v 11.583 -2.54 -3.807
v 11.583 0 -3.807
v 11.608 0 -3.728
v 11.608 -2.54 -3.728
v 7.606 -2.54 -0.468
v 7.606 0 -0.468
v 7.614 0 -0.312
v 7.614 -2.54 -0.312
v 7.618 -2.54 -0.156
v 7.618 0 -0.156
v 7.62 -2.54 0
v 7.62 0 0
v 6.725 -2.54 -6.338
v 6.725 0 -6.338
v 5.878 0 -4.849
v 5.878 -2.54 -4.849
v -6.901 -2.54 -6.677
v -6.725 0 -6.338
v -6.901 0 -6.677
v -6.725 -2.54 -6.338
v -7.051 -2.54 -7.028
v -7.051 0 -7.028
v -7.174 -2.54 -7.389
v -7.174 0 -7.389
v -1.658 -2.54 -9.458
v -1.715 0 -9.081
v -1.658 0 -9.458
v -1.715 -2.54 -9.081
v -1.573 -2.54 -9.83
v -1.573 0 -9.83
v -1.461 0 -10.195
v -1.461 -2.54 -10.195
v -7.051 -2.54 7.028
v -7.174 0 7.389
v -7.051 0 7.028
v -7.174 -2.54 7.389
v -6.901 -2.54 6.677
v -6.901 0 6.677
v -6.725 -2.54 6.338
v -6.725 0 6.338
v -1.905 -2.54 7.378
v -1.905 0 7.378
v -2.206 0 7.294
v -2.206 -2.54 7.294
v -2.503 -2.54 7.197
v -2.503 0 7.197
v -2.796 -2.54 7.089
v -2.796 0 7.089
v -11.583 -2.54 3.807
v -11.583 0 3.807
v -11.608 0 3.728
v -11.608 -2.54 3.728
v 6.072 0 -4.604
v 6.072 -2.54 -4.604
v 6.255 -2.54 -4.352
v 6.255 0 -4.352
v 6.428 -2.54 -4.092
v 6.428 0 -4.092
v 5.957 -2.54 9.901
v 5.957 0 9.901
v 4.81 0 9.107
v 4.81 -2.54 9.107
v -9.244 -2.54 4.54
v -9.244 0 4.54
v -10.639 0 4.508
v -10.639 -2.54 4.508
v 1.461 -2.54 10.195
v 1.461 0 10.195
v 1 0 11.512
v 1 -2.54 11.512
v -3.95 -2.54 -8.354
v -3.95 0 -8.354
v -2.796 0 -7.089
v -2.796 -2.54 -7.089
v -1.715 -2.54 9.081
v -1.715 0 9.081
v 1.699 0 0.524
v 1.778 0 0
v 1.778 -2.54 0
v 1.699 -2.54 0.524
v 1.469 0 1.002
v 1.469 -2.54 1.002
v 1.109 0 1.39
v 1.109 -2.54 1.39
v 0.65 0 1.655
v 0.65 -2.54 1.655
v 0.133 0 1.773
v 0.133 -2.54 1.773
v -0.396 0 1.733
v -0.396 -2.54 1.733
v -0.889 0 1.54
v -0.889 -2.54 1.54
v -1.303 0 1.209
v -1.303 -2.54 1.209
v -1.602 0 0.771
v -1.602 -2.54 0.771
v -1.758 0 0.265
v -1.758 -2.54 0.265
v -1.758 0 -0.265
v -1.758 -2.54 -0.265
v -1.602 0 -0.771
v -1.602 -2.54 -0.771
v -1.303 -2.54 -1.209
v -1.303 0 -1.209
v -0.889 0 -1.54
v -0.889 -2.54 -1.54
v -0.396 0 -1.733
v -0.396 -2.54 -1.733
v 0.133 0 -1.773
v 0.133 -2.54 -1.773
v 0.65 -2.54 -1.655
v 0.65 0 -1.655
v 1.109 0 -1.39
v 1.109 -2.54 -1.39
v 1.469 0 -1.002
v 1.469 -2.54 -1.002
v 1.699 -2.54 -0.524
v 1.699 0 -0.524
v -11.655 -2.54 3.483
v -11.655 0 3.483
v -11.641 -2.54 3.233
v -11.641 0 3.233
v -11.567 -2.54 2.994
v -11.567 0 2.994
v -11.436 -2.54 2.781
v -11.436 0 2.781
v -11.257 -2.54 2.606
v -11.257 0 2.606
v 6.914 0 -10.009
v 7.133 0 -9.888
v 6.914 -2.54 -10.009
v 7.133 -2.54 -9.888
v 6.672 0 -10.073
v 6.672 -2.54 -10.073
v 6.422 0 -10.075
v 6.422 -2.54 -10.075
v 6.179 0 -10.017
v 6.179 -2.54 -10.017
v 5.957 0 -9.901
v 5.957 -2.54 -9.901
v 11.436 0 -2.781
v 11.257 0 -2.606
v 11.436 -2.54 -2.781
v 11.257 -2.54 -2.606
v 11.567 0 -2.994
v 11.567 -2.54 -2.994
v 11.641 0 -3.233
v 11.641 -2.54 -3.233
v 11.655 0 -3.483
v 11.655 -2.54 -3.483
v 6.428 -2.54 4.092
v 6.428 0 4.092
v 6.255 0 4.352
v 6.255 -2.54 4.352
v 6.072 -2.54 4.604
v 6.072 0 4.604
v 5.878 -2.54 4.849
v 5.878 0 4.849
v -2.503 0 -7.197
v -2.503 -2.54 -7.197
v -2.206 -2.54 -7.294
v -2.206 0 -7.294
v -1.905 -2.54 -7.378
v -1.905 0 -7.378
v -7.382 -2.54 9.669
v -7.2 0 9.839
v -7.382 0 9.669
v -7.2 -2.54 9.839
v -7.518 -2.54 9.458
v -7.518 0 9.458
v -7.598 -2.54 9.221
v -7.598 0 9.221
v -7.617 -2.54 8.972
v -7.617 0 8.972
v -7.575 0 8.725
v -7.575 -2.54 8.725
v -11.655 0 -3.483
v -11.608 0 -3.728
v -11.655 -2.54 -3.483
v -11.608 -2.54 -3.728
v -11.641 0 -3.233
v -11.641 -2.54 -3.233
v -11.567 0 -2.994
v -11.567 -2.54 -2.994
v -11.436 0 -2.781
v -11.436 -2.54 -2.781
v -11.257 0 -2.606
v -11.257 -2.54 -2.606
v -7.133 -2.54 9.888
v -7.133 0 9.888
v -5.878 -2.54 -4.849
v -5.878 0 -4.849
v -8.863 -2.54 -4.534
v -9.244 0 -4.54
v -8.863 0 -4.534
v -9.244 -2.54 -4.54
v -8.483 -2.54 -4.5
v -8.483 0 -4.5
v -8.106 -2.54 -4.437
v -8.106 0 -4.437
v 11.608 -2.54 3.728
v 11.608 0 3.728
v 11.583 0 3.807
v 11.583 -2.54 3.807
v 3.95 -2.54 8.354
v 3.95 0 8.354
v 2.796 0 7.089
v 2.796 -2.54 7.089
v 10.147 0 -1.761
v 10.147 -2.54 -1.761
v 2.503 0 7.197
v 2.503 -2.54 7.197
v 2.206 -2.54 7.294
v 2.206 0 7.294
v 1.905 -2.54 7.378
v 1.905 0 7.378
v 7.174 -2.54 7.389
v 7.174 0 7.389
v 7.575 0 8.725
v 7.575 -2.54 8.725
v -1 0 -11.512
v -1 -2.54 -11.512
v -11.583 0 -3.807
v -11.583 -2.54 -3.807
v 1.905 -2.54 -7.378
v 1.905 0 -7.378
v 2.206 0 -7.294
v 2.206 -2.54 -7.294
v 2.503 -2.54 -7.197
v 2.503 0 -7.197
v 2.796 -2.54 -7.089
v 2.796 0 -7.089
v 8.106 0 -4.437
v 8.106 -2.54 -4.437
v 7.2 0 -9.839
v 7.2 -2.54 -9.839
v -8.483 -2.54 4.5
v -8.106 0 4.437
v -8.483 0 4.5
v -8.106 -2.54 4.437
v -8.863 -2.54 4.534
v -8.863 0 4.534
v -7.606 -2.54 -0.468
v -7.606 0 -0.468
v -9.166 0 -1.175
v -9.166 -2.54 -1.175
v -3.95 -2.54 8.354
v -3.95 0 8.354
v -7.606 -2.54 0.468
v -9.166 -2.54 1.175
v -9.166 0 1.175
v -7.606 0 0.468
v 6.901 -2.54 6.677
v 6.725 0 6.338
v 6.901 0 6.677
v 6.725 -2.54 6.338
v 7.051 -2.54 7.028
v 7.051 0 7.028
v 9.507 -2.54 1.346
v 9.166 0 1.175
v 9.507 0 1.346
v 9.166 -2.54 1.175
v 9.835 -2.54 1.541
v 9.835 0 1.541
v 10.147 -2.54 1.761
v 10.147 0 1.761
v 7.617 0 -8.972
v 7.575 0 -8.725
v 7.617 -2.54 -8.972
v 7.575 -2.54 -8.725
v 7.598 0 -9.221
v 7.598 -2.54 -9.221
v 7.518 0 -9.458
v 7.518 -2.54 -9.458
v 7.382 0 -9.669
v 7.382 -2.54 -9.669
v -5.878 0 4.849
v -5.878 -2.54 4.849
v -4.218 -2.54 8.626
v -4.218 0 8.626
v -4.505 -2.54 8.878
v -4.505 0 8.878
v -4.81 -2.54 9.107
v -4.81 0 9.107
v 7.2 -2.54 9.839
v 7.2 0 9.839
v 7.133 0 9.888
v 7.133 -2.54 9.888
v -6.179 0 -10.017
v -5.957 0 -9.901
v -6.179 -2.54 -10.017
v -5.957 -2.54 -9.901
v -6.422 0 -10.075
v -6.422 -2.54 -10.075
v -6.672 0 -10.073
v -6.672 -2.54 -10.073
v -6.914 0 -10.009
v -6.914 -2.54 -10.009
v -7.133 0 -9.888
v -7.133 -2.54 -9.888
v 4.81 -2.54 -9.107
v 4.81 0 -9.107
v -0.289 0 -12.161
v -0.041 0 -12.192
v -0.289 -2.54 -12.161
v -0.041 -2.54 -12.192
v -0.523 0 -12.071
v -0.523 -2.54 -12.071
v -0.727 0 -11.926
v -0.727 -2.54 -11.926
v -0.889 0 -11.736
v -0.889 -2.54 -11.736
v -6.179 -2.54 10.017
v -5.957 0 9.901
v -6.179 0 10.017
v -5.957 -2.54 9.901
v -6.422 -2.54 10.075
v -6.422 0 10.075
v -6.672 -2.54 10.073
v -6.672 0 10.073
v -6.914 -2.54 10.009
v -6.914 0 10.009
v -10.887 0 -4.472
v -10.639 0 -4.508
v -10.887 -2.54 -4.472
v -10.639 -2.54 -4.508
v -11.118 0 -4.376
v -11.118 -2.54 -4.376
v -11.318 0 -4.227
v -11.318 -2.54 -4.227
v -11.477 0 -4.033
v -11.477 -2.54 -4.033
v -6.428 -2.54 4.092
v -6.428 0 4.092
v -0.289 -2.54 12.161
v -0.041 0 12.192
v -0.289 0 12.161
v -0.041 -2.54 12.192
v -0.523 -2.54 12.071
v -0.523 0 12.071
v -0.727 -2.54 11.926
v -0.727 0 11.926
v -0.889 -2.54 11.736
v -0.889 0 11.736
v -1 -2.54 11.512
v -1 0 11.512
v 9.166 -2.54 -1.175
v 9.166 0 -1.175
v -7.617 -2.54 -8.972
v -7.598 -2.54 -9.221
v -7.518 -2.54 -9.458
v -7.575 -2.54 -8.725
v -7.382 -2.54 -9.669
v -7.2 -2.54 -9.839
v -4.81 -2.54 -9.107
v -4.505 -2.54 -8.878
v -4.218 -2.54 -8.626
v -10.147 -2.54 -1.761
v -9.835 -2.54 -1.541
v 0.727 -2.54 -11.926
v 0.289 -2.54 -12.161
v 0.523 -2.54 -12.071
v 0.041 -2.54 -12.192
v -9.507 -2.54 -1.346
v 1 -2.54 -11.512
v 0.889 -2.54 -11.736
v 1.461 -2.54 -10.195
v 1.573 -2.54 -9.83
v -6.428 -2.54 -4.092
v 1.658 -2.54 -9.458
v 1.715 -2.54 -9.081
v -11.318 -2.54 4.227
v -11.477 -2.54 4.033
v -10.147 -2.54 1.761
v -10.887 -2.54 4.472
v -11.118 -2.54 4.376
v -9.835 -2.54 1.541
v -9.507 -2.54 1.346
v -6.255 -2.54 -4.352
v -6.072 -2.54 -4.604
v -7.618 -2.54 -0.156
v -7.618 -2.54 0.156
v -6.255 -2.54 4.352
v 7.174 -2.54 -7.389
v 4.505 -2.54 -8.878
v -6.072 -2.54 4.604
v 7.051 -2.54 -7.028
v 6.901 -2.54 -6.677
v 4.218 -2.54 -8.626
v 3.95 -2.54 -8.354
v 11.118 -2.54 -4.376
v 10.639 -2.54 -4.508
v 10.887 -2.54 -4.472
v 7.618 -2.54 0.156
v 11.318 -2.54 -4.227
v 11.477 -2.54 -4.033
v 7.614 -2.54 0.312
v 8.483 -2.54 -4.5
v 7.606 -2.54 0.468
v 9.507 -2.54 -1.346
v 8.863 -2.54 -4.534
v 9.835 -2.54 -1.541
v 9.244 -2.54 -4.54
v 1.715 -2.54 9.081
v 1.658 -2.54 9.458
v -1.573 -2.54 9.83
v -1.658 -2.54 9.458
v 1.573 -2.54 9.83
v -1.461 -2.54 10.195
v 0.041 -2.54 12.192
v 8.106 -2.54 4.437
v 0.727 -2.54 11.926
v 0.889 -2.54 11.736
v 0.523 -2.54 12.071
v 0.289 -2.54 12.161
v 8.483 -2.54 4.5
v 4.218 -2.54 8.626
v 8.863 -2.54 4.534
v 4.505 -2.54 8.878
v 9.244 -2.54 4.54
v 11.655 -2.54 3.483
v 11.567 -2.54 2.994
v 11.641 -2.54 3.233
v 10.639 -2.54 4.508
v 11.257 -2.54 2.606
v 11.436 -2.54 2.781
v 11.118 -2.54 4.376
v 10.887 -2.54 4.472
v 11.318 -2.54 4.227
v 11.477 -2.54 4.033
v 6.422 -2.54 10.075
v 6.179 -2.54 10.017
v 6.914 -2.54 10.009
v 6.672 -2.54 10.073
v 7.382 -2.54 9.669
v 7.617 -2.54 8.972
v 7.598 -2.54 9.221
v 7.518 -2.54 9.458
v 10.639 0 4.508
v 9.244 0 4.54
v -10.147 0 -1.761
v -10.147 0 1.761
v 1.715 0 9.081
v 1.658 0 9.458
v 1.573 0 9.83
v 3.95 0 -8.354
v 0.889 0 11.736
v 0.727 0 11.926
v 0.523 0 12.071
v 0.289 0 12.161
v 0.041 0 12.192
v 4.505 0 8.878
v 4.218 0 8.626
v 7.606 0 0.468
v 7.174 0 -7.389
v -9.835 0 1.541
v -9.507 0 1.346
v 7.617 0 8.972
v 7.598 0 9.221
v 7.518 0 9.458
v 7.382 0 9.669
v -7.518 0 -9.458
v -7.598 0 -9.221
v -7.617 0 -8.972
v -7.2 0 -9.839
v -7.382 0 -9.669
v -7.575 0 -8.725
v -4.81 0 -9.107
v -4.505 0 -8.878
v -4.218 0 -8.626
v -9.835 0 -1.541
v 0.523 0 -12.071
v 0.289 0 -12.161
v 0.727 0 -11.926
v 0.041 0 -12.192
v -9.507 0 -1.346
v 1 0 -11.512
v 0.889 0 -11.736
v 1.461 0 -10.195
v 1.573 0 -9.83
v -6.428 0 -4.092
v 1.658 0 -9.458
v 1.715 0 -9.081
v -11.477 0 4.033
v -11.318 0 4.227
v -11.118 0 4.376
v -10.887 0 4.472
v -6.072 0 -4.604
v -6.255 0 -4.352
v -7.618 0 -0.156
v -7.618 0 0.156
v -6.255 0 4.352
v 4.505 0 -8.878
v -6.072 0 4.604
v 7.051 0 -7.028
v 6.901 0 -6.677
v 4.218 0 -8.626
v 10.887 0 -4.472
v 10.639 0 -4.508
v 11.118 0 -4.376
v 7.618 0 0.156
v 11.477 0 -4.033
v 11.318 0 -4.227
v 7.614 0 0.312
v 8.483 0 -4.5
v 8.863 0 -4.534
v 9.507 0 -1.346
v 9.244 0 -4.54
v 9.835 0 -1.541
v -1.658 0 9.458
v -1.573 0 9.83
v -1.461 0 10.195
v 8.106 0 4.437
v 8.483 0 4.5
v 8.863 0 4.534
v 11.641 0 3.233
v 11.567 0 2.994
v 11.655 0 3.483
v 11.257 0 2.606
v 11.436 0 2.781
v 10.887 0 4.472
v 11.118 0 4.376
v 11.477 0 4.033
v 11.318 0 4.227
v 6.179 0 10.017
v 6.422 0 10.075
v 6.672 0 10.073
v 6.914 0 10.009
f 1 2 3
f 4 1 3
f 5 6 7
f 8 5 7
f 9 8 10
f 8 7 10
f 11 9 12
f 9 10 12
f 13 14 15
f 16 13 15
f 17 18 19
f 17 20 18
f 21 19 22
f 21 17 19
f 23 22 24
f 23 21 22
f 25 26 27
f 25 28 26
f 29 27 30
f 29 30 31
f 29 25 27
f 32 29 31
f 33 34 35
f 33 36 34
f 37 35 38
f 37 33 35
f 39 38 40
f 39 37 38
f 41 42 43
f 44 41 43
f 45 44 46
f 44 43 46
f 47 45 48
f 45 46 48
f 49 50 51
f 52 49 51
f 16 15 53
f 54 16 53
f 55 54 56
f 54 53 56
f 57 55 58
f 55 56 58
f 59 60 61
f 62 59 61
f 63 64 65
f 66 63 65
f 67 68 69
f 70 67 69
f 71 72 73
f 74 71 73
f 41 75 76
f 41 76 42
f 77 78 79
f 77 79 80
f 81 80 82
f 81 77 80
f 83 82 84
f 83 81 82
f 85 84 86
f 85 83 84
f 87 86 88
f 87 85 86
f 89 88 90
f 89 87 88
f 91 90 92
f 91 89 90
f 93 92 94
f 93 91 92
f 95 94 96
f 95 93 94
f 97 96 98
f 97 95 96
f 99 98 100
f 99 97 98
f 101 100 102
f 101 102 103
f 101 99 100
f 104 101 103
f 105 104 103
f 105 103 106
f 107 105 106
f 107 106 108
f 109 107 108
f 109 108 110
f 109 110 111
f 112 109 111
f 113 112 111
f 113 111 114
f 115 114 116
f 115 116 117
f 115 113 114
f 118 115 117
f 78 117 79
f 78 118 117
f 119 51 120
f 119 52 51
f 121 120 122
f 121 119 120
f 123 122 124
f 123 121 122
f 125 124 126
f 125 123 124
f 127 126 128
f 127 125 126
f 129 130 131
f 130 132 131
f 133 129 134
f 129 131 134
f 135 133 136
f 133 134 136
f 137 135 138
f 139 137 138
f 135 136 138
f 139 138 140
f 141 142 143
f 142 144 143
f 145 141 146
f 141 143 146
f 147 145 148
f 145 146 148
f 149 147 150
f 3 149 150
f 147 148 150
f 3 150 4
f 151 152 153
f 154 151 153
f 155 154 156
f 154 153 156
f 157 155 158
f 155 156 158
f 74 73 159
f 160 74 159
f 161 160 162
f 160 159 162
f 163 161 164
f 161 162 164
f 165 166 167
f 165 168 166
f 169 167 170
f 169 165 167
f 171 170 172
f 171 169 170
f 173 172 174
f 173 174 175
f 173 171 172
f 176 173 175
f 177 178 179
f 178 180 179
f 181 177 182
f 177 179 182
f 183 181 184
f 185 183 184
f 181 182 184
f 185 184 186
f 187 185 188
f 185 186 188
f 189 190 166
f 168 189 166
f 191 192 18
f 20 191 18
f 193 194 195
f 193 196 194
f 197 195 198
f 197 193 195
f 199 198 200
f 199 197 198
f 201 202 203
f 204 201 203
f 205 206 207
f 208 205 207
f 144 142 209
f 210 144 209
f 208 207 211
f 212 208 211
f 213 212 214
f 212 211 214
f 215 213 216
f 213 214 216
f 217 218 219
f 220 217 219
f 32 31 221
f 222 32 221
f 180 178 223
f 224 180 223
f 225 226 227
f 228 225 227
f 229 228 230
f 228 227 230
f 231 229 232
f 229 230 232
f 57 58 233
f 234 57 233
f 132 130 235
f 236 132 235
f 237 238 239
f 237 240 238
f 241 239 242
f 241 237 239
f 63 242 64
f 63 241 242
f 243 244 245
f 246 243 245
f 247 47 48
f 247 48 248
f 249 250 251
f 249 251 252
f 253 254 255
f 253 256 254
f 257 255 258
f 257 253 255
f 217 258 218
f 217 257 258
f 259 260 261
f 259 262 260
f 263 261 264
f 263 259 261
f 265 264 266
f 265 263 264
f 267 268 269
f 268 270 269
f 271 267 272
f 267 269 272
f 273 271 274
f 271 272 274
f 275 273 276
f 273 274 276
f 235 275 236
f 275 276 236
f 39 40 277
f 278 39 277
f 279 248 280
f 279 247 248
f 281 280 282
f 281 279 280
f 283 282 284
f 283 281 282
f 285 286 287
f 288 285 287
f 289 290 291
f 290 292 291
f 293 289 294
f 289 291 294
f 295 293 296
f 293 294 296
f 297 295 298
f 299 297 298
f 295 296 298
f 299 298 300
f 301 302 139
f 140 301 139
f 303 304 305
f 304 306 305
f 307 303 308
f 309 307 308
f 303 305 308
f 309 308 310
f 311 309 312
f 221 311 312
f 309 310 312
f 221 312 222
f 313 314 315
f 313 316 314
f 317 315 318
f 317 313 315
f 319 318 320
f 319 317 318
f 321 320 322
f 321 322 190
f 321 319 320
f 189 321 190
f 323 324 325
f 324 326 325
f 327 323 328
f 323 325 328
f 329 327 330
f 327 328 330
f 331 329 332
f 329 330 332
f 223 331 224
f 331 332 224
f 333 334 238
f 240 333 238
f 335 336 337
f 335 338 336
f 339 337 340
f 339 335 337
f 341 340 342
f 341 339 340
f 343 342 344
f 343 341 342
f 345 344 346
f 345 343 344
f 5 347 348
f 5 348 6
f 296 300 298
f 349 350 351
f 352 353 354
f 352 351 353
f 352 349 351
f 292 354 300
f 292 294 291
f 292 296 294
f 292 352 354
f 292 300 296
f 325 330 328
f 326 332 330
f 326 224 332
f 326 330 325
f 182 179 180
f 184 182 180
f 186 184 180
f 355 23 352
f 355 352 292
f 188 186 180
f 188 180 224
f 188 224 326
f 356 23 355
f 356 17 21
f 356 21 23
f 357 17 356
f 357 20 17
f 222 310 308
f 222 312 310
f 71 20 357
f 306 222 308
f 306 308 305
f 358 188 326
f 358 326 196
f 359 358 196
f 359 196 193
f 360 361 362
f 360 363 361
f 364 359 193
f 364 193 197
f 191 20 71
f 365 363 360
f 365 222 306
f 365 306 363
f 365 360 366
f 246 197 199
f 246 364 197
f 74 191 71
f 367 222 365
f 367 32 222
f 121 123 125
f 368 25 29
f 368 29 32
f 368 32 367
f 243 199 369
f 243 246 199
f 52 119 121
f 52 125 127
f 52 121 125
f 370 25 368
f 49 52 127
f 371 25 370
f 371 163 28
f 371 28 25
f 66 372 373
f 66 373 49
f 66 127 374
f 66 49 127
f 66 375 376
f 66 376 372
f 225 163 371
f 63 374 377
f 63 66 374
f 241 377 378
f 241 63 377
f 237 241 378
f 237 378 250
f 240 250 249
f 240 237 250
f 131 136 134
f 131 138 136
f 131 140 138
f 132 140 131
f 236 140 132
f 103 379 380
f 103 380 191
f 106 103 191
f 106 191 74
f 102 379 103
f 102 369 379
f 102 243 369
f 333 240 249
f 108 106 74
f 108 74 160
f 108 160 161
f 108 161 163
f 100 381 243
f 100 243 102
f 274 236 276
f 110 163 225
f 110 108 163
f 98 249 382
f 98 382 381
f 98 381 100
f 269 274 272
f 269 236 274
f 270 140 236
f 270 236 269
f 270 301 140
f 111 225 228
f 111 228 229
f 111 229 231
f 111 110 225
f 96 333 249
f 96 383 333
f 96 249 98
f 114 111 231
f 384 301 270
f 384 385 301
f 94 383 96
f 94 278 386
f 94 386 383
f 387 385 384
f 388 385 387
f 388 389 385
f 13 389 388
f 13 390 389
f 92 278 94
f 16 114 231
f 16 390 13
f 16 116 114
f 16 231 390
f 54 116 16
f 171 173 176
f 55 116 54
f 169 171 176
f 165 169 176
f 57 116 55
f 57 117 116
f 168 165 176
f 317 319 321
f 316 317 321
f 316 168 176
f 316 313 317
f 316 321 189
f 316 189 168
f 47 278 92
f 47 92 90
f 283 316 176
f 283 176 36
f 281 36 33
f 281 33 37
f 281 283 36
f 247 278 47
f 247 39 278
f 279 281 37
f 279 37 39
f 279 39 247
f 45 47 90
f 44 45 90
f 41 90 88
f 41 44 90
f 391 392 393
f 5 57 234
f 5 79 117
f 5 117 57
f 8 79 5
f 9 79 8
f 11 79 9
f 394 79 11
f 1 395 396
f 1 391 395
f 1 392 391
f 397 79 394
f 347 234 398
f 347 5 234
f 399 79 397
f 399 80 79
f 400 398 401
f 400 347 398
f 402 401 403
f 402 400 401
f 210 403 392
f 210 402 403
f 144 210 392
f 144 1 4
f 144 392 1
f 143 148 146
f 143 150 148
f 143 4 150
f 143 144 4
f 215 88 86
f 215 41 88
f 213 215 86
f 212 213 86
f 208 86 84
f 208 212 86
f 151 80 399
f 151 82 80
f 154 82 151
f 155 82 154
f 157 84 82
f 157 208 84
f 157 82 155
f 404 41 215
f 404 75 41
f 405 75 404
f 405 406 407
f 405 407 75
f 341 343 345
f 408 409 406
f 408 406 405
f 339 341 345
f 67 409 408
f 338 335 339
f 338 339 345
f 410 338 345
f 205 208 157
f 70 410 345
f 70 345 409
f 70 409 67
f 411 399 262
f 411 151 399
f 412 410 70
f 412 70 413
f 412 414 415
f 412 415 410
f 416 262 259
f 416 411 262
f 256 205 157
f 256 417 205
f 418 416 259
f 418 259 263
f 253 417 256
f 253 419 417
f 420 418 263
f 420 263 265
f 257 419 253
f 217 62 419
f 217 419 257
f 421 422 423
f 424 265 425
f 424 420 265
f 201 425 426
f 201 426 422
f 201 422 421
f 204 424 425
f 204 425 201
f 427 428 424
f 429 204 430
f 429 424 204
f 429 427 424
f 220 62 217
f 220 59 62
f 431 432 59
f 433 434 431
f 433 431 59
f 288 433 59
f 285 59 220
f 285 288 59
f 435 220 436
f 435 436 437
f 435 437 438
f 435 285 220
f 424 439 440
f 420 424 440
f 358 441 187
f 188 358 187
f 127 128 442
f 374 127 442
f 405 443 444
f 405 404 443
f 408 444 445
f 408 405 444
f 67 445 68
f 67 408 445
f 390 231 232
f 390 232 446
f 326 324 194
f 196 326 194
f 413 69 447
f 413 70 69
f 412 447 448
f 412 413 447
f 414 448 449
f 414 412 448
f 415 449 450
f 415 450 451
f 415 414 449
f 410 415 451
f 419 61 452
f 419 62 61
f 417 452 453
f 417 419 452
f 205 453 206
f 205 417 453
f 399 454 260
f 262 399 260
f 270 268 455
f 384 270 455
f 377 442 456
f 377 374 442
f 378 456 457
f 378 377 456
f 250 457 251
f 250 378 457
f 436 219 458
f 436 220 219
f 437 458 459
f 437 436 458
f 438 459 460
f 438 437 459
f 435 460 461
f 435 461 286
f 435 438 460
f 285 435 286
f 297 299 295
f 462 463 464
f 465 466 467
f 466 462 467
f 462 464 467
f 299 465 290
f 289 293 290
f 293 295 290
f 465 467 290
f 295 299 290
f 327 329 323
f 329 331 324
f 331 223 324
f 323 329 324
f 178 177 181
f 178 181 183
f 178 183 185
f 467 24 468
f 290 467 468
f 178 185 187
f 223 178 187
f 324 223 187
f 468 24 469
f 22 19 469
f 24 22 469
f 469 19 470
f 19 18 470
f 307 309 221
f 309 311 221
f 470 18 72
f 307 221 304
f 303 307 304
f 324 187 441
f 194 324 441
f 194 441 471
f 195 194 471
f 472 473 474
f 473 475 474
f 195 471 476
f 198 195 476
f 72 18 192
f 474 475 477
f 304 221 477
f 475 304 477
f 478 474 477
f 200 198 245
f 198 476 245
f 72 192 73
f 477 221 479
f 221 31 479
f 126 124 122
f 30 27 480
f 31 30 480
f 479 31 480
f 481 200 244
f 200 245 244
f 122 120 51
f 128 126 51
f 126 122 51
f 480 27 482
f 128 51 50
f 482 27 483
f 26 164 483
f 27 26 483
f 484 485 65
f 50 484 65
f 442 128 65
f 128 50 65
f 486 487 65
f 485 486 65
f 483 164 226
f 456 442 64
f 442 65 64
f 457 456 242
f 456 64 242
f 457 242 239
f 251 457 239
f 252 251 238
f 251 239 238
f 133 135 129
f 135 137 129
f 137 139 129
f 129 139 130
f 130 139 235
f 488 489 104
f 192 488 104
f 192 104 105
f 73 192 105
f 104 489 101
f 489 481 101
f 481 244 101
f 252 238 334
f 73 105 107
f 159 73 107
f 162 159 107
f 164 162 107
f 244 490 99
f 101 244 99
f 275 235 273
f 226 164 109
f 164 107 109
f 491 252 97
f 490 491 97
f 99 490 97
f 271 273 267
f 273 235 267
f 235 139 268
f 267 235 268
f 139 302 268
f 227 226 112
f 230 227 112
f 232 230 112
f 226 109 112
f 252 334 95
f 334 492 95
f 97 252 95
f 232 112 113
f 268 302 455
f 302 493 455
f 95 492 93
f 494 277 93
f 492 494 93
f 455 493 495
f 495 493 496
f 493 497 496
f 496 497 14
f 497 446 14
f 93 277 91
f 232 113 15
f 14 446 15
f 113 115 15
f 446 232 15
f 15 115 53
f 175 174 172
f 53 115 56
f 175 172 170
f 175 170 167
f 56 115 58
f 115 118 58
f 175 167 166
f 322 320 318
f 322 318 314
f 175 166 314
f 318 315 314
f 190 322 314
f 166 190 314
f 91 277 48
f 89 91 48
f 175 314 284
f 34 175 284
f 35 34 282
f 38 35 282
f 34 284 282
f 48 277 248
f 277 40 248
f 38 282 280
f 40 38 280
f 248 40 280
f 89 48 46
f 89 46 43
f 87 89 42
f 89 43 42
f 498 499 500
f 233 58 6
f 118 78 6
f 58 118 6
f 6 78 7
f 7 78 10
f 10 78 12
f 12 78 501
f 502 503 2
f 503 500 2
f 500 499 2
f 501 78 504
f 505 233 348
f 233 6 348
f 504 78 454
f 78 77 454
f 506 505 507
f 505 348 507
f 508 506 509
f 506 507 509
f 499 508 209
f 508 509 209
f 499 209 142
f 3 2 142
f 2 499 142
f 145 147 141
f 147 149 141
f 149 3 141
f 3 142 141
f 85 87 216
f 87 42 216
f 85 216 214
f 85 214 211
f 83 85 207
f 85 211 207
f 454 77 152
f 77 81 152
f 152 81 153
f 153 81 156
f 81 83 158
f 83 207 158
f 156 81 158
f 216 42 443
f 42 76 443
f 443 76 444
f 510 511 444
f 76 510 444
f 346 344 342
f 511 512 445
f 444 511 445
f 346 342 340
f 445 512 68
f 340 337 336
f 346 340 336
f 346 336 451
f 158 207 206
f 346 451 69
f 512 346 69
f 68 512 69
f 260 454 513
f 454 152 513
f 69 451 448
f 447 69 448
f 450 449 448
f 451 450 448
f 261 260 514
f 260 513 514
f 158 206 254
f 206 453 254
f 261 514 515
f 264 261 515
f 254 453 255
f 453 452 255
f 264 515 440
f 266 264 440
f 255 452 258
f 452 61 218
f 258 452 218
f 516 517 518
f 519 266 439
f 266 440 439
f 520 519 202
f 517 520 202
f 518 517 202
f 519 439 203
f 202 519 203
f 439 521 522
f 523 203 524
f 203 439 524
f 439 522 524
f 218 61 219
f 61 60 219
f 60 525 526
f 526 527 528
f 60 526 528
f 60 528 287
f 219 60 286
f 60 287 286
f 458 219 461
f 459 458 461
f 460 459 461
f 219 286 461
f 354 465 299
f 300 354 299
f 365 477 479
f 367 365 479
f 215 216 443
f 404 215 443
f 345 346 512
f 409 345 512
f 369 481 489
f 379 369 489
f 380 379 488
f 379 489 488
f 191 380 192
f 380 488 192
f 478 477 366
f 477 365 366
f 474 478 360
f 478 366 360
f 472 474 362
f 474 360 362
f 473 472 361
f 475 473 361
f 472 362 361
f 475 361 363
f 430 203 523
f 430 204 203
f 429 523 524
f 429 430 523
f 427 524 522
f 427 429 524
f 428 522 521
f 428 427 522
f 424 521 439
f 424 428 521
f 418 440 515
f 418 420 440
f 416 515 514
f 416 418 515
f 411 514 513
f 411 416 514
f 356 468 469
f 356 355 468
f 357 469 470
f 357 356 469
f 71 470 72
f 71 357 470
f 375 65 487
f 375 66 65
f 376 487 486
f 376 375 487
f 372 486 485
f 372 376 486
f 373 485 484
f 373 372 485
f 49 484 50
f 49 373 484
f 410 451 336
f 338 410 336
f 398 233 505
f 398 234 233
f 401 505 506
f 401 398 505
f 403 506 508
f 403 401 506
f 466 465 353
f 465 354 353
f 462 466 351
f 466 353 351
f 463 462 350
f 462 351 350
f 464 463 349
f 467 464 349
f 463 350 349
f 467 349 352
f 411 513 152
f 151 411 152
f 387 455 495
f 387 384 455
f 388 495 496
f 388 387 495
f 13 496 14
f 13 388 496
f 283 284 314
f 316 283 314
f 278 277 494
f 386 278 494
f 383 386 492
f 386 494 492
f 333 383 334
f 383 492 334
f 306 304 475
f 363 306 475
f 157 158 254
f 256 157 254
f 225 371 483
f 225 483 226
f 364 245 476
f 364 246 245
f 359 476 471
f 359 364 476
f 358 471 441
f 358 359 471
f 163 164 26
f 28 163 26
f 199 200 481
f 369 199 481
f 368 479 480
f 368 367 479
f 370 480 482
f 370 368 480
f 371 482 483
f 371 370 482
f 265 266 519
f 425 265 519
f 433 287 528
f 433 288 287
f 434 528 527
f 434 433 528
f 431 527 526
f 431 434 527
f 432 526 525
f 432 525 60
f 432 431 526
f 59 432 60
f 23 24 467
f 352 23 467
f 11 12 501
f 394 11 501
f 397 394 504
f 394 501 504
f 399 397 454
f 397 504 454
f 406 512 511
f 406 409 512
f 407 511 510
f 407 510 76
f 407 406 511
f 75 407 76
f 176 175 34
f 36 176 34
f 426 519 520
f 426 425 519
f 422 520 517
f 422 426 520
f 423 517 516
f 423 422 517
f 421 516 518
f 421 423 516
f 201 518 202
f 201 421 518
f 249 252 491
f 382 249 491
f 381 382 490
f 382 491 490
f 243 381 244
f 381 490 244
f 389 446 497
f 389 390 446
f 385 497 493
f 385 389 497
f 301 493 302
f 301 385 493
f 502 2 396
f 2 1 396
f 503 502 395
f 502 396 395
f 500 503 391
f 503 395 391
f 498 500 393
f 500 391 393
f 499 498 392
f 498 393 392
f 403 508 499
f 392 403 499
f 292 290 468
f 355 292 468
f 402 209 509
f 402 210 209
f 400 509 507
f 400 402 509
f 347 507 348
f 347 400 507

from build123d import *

# Parameters (mm, degrees)
F0_R     = 1.778
F1_DEPTH = 2.54
F2_R     = 5.08
F3_R     = 1.016


with BuildPart() as f1:
    # F0 (on Front) → F1 (new body)
    with BuildSketch(Plane.XZ):
        with BuildLine():
            ThreePointArc((7.605604, -0.468175), (7.6164, -0.234198), (7.62, 0))
            ThreePointArc((7.62, 0), (7.6164, 0.234198), (7.605604, 0.468175))
            ThreePointArc((7.605604, 0.468175), (7.247051, 2.354709), (6.428249, 4.0917))
            ThreePointArc((6.428249, 4.0917), (6.164709, 4.478924), (5.877877, 4.849223))
            ThreePointArc((5.877877, 4.849223), (4.478924, 6.164709), (2.795522, 7.088685))
            ThreePointArc((2.795522, 7.088685), (2.354709, 7.247051), (1.905, 7.378033))
            ThreePointArc((1.905, 7.378033), (0, 7.62), (-1.905, 7.378033))
            ThreePointArc((-1.905, 7.378033), (-2.354709, 7.247051), (-2.795522, 7.088685))
            ThreePointArc((-2.795522, 7.088685), (-4.478924, 6.164709), (-5.877877, 4.849223))
            ThreePointArc((-5.877877, 4.849223), (-6.164709, 4.478924), (-6.428249, 4.0917))
            ThreePointArc((-6.428249, 4.0917), (-7.247051, 2.354709), (-7.605604, 0.468175))
            ThreePointArc((-7.605604, 0.468175), (-7.62, 0), (-7.605604, -0.468175))
            ThreePointArc((-7.605604, -0.468175), (-7.247051, -2.354709), (-6.428249, -4.0917))
            ThreePointArc((-6.428249, -4.0917), (-6.164709, -4.478924), (-5.877877, -4.849223))
            ThreePointArc((-5.877877, -4.849223), (-4.478924, -6.164709), (-2.795522, -7.088685))
            ThreePointArc((-2.795522, -7.088685), (-2.354709, -7.247051), (-1.905, -7.378033))
            ThreePointArc((-1.905, -7.378033), (0, -7.62), (1.905, -7.378033))
            ThreePointArc((1.905, -7.378033), (2.354709, -7.247051), (2.795522, -7.088685))
            ThreePointArc((2.795522, -7.088685), (4.478924, -6.164709), (5.877877, -4.849223))
            ThreePointArc((5.877877, -4.849223), (6.164709, -4.478924), (6.428249, -4.0917))
            ThreePointArc((6.428249, -4.0917), (7.247051, -2.354709), (7.605604, -0.468175))
        make_face()
        Circle(F0_R, mode=Mode.SUBTRACT)
        with BuildLine():
            ThreePointArc((6.428249, 4.0917), (7.247051, 2.354709), (7.605604, 0.468175))
            Line((7.605604, 0.468175), (9.689785, 1.412438))
            Line((9.689785, 1.412438), (11.830752, 3.04283))
            Line((11.830752, 3.04283), (11.35981, 4.49224))
            Line((11.35981, 4.49224), (8.66941, 4.552826))
            Line((8.66941, 4.552826), (6.428249, 4.0917))
        make_face()
        with BuildLine():
            Line((9.689785, -1.412438), (7.605604, -0.468175))
            ThreePointArc((7.605604, -0.468175), (7.247051, -2.354709), (6.428249, -4.0917))
            Line((6.428249, -4.0917), (8.66941, -4.552826))
            Line((8.66941, -4.552826), (11.35981, -4.49224))
            Line((11.35981, -4.49224), (11.830752, -3.04283))
            Line((11.830752, -3.04283), (9.689785, -1.412438))
        make_face()
        with BuildLine():
            ThreePointArc((2.795522, 7.088685), (4.478924, 6.164709), (5.877877, 4.849223))
            Line((5.877877, 4.849223), (7.00899, 6.838199))
            Line((7.00899, 6.838199), (7.782749, 9.415643))
            Line((7.782749, 9.415643), (6.549807, 10.311428))
            Line((6.549807, 10.311428), (4.337616, 8.779065))
            Line((4.337616, 8.779065), (2.795522, 7.088685))
        make_face()
        with BuildLine():
            Line((7.00899, -6.838199), (5.877877, -4.849223))
            ThreePointArc((5.877877, -4.849223), (4.478924, -6.164709), (2.795522, -7.088685))
            Line((2.795522, -7.088685), (4.337616, -8.779065))
            Line((4.337616, -8.779065), (6.549807, -10.311428))
            Line((6.549807, -10.311428), (7.782749, -9.415643))
            Line((7.782749, -9.415643), (7.00899, -6.838199))
        make_face()
        with BuildLine():
            ThreePointArc((-1.905, 7.378033), (0, 7.62), (1.905, 7.378033))
            Line((1.905, 7.378033), (1.651, 9.652))
            Line((1.651, 9.652), (0.762, 12.192))
            Line((0.762, 12.192), (-0.762, 12.192))
            Line((-0.762, 12.192), (-1.651, 9.652))
            Line((-1.651, 9.652), (-1.905, 7.378033))
        make_face()
        with BuildLine():
            Line((1.651, -9.652), (1.905, -7.378033))
            ThreePointArc((1.905, -7.378033), (0, -7.62), (-1.905, -7.378033))
            Line((-1.905, -7.378033), (-1.651, -9.652))
            Line((-1.651, -9.652), (-0.762, -12.192))
            Line((-0.762, -12.192), (0.762, -12.192))
            Line((0.762, -12.192), (1.651, -9.652))
        make_face()
        with BuildLine():
            ThreePointArc((-5.877877, 4.849223), (-4.478924, 6.164709), (-2.795522, 7.088685))
            Line((-2.795522, 7.088685), (-4.337616, 8.779065))
            Line((-4.337616, 8.779065), (-6.549807, 10.311428))
            Line((-6.549807, 10.311428), (-7.782749, 9.415643))
            Line((-7.782749, 9.415643), (-7.00899, 6.838199))
            Line((-7.00899, 6.838199), (-5.877877, 4.849223))
        make_face()
        with BuildLine():
            Line((-4.337616, -8.779065), (-2.795522, -7.088685))
            ThreePointArc((-2.795522, -7.088685), (-4.478924, -6.164709), (-5.877877, -4.849223))
            Line((-5.877877, -4.849223), (-7.00899, -6.838199))
            Line((-7.00899, -6.838199), (-7.782749, -9.415643))
            Line((-7.782749, -9.415643), (-6.549807, -10.311428))
            Line((-6.549807, -10.311428), (-4.337616, -8.779065))
        make_face()
        with BuildLine():
            ThreePointArc((-7.605604, 0.468175), (-7.247051, 2.354709), (-6.428249, 4.0917))
            Line((-6.428249, 4.0917), (-8.66941, 4.552826))
            Line((-8.66941, 4.552826), (-11.35981, 4.49224))
            Line((-11.35981, 4.49224), (-11.830752, 3.04283))
            Line((-11.830752, 3.04283), (-9.689785, 1.412438))
            Line((-9.689785, 1.412438), (-7.605604, 0.468175))
        make_face()
        with BuildLine():
            Line((-8.66941, -4.552826), (-6.428249, -4.0917))
            ThreePointArc((-6.428249, -4.0917), (-7.247051, -2.354709), (-7.605604, -0.468175))
            Line((-7.605604, -0.468175), (-9.689785, -1.412438))
            Line((-9.689785, -1.412438), (-11.830752, -3.04283))
            Line((-11.830752, -3.04283), (-11.35981, -4.49224))
            Line((-11.35981, -4.49224), (-8.66941, -4.552826))
        make_face()
    extrude(amount=F1_DEPTH)

    # F2
    f2_edges = [f1.edges().sort_by_distance(p)[0] for p in [
        (7.00899, -1.27, 6.838199),
        (4.337616, -1.27, 8.779065),
        (1.651, -1.27, 9.652),
        (-4.337616, -1.27, 8.779065),
        (-8.66941, -1.27, 4.552826),
        (-9.689785, -1.27, -1.412438),
        (-7.00899, -1.27, -6.838199),
        (-1.651, -1.27, -9.652),
        (4.337616, -1.27, -8.779065),
        (8.66941, -1.27, -4.552826),
        (9.689785, -1.27, 1.412438),
        (9.689785, -1.27, -1.412438),
        (8.66941, -1.27, 4.552826),
        (-1.651, -1.27, 9.652),
        (-7.00899, -1.27, 6.838199),
        (-9.689785, -1.27, 1.412438),
        (-8.66941, -1.27, -4.552826),
        (-4.337616, -1.27, -8.779065),
        (1.651, -1.27, -9.652),
        (7.00899, -1.27, -6.838199),
    ]]
    fillet(f2_edges, radius=F2_R)

    # F3
    f3_edges = [f1.edges().sort_by_distance(p)[0] for p in [
        (0.762, -1.27, 12.192),
        (-0.762, -1.27, 12.192),
        (-6.549807, -1.27, 10.311428),
        (-7.782749, -1.27, 9.415643),
        (-11.35981, -1.27, 4.49224),
        (6.549807, -1.27, 10.311428),
        (7.782749, -1.27, 9.415643),
        (11.35981, -1.27, 4.49224),
        (-11.830752, -1.27, 3.04283),
        (-11.830752, -1.27, -3.04283),
        (-11.35981, -1.27, -4.49224),
        (-7.782749, -1.27, -9.415643),
        (-6.549807, -1.27, -10.311428),
        (-0.762, -1.27, -12.192),
        (0.762, -1.27, -12.192),
        (6.549807, -1.27, -10.311428),
        (7.782749, -1.27, -9.415643),
        (11.830752, -1.27, -3.04283),
        (11.35981, -1.27, -4.49224),
        (11.830752, -1.27, 3.04283),
    ]]
    fillet(f3_edges, radius=F3_R)


solid = f1.part
